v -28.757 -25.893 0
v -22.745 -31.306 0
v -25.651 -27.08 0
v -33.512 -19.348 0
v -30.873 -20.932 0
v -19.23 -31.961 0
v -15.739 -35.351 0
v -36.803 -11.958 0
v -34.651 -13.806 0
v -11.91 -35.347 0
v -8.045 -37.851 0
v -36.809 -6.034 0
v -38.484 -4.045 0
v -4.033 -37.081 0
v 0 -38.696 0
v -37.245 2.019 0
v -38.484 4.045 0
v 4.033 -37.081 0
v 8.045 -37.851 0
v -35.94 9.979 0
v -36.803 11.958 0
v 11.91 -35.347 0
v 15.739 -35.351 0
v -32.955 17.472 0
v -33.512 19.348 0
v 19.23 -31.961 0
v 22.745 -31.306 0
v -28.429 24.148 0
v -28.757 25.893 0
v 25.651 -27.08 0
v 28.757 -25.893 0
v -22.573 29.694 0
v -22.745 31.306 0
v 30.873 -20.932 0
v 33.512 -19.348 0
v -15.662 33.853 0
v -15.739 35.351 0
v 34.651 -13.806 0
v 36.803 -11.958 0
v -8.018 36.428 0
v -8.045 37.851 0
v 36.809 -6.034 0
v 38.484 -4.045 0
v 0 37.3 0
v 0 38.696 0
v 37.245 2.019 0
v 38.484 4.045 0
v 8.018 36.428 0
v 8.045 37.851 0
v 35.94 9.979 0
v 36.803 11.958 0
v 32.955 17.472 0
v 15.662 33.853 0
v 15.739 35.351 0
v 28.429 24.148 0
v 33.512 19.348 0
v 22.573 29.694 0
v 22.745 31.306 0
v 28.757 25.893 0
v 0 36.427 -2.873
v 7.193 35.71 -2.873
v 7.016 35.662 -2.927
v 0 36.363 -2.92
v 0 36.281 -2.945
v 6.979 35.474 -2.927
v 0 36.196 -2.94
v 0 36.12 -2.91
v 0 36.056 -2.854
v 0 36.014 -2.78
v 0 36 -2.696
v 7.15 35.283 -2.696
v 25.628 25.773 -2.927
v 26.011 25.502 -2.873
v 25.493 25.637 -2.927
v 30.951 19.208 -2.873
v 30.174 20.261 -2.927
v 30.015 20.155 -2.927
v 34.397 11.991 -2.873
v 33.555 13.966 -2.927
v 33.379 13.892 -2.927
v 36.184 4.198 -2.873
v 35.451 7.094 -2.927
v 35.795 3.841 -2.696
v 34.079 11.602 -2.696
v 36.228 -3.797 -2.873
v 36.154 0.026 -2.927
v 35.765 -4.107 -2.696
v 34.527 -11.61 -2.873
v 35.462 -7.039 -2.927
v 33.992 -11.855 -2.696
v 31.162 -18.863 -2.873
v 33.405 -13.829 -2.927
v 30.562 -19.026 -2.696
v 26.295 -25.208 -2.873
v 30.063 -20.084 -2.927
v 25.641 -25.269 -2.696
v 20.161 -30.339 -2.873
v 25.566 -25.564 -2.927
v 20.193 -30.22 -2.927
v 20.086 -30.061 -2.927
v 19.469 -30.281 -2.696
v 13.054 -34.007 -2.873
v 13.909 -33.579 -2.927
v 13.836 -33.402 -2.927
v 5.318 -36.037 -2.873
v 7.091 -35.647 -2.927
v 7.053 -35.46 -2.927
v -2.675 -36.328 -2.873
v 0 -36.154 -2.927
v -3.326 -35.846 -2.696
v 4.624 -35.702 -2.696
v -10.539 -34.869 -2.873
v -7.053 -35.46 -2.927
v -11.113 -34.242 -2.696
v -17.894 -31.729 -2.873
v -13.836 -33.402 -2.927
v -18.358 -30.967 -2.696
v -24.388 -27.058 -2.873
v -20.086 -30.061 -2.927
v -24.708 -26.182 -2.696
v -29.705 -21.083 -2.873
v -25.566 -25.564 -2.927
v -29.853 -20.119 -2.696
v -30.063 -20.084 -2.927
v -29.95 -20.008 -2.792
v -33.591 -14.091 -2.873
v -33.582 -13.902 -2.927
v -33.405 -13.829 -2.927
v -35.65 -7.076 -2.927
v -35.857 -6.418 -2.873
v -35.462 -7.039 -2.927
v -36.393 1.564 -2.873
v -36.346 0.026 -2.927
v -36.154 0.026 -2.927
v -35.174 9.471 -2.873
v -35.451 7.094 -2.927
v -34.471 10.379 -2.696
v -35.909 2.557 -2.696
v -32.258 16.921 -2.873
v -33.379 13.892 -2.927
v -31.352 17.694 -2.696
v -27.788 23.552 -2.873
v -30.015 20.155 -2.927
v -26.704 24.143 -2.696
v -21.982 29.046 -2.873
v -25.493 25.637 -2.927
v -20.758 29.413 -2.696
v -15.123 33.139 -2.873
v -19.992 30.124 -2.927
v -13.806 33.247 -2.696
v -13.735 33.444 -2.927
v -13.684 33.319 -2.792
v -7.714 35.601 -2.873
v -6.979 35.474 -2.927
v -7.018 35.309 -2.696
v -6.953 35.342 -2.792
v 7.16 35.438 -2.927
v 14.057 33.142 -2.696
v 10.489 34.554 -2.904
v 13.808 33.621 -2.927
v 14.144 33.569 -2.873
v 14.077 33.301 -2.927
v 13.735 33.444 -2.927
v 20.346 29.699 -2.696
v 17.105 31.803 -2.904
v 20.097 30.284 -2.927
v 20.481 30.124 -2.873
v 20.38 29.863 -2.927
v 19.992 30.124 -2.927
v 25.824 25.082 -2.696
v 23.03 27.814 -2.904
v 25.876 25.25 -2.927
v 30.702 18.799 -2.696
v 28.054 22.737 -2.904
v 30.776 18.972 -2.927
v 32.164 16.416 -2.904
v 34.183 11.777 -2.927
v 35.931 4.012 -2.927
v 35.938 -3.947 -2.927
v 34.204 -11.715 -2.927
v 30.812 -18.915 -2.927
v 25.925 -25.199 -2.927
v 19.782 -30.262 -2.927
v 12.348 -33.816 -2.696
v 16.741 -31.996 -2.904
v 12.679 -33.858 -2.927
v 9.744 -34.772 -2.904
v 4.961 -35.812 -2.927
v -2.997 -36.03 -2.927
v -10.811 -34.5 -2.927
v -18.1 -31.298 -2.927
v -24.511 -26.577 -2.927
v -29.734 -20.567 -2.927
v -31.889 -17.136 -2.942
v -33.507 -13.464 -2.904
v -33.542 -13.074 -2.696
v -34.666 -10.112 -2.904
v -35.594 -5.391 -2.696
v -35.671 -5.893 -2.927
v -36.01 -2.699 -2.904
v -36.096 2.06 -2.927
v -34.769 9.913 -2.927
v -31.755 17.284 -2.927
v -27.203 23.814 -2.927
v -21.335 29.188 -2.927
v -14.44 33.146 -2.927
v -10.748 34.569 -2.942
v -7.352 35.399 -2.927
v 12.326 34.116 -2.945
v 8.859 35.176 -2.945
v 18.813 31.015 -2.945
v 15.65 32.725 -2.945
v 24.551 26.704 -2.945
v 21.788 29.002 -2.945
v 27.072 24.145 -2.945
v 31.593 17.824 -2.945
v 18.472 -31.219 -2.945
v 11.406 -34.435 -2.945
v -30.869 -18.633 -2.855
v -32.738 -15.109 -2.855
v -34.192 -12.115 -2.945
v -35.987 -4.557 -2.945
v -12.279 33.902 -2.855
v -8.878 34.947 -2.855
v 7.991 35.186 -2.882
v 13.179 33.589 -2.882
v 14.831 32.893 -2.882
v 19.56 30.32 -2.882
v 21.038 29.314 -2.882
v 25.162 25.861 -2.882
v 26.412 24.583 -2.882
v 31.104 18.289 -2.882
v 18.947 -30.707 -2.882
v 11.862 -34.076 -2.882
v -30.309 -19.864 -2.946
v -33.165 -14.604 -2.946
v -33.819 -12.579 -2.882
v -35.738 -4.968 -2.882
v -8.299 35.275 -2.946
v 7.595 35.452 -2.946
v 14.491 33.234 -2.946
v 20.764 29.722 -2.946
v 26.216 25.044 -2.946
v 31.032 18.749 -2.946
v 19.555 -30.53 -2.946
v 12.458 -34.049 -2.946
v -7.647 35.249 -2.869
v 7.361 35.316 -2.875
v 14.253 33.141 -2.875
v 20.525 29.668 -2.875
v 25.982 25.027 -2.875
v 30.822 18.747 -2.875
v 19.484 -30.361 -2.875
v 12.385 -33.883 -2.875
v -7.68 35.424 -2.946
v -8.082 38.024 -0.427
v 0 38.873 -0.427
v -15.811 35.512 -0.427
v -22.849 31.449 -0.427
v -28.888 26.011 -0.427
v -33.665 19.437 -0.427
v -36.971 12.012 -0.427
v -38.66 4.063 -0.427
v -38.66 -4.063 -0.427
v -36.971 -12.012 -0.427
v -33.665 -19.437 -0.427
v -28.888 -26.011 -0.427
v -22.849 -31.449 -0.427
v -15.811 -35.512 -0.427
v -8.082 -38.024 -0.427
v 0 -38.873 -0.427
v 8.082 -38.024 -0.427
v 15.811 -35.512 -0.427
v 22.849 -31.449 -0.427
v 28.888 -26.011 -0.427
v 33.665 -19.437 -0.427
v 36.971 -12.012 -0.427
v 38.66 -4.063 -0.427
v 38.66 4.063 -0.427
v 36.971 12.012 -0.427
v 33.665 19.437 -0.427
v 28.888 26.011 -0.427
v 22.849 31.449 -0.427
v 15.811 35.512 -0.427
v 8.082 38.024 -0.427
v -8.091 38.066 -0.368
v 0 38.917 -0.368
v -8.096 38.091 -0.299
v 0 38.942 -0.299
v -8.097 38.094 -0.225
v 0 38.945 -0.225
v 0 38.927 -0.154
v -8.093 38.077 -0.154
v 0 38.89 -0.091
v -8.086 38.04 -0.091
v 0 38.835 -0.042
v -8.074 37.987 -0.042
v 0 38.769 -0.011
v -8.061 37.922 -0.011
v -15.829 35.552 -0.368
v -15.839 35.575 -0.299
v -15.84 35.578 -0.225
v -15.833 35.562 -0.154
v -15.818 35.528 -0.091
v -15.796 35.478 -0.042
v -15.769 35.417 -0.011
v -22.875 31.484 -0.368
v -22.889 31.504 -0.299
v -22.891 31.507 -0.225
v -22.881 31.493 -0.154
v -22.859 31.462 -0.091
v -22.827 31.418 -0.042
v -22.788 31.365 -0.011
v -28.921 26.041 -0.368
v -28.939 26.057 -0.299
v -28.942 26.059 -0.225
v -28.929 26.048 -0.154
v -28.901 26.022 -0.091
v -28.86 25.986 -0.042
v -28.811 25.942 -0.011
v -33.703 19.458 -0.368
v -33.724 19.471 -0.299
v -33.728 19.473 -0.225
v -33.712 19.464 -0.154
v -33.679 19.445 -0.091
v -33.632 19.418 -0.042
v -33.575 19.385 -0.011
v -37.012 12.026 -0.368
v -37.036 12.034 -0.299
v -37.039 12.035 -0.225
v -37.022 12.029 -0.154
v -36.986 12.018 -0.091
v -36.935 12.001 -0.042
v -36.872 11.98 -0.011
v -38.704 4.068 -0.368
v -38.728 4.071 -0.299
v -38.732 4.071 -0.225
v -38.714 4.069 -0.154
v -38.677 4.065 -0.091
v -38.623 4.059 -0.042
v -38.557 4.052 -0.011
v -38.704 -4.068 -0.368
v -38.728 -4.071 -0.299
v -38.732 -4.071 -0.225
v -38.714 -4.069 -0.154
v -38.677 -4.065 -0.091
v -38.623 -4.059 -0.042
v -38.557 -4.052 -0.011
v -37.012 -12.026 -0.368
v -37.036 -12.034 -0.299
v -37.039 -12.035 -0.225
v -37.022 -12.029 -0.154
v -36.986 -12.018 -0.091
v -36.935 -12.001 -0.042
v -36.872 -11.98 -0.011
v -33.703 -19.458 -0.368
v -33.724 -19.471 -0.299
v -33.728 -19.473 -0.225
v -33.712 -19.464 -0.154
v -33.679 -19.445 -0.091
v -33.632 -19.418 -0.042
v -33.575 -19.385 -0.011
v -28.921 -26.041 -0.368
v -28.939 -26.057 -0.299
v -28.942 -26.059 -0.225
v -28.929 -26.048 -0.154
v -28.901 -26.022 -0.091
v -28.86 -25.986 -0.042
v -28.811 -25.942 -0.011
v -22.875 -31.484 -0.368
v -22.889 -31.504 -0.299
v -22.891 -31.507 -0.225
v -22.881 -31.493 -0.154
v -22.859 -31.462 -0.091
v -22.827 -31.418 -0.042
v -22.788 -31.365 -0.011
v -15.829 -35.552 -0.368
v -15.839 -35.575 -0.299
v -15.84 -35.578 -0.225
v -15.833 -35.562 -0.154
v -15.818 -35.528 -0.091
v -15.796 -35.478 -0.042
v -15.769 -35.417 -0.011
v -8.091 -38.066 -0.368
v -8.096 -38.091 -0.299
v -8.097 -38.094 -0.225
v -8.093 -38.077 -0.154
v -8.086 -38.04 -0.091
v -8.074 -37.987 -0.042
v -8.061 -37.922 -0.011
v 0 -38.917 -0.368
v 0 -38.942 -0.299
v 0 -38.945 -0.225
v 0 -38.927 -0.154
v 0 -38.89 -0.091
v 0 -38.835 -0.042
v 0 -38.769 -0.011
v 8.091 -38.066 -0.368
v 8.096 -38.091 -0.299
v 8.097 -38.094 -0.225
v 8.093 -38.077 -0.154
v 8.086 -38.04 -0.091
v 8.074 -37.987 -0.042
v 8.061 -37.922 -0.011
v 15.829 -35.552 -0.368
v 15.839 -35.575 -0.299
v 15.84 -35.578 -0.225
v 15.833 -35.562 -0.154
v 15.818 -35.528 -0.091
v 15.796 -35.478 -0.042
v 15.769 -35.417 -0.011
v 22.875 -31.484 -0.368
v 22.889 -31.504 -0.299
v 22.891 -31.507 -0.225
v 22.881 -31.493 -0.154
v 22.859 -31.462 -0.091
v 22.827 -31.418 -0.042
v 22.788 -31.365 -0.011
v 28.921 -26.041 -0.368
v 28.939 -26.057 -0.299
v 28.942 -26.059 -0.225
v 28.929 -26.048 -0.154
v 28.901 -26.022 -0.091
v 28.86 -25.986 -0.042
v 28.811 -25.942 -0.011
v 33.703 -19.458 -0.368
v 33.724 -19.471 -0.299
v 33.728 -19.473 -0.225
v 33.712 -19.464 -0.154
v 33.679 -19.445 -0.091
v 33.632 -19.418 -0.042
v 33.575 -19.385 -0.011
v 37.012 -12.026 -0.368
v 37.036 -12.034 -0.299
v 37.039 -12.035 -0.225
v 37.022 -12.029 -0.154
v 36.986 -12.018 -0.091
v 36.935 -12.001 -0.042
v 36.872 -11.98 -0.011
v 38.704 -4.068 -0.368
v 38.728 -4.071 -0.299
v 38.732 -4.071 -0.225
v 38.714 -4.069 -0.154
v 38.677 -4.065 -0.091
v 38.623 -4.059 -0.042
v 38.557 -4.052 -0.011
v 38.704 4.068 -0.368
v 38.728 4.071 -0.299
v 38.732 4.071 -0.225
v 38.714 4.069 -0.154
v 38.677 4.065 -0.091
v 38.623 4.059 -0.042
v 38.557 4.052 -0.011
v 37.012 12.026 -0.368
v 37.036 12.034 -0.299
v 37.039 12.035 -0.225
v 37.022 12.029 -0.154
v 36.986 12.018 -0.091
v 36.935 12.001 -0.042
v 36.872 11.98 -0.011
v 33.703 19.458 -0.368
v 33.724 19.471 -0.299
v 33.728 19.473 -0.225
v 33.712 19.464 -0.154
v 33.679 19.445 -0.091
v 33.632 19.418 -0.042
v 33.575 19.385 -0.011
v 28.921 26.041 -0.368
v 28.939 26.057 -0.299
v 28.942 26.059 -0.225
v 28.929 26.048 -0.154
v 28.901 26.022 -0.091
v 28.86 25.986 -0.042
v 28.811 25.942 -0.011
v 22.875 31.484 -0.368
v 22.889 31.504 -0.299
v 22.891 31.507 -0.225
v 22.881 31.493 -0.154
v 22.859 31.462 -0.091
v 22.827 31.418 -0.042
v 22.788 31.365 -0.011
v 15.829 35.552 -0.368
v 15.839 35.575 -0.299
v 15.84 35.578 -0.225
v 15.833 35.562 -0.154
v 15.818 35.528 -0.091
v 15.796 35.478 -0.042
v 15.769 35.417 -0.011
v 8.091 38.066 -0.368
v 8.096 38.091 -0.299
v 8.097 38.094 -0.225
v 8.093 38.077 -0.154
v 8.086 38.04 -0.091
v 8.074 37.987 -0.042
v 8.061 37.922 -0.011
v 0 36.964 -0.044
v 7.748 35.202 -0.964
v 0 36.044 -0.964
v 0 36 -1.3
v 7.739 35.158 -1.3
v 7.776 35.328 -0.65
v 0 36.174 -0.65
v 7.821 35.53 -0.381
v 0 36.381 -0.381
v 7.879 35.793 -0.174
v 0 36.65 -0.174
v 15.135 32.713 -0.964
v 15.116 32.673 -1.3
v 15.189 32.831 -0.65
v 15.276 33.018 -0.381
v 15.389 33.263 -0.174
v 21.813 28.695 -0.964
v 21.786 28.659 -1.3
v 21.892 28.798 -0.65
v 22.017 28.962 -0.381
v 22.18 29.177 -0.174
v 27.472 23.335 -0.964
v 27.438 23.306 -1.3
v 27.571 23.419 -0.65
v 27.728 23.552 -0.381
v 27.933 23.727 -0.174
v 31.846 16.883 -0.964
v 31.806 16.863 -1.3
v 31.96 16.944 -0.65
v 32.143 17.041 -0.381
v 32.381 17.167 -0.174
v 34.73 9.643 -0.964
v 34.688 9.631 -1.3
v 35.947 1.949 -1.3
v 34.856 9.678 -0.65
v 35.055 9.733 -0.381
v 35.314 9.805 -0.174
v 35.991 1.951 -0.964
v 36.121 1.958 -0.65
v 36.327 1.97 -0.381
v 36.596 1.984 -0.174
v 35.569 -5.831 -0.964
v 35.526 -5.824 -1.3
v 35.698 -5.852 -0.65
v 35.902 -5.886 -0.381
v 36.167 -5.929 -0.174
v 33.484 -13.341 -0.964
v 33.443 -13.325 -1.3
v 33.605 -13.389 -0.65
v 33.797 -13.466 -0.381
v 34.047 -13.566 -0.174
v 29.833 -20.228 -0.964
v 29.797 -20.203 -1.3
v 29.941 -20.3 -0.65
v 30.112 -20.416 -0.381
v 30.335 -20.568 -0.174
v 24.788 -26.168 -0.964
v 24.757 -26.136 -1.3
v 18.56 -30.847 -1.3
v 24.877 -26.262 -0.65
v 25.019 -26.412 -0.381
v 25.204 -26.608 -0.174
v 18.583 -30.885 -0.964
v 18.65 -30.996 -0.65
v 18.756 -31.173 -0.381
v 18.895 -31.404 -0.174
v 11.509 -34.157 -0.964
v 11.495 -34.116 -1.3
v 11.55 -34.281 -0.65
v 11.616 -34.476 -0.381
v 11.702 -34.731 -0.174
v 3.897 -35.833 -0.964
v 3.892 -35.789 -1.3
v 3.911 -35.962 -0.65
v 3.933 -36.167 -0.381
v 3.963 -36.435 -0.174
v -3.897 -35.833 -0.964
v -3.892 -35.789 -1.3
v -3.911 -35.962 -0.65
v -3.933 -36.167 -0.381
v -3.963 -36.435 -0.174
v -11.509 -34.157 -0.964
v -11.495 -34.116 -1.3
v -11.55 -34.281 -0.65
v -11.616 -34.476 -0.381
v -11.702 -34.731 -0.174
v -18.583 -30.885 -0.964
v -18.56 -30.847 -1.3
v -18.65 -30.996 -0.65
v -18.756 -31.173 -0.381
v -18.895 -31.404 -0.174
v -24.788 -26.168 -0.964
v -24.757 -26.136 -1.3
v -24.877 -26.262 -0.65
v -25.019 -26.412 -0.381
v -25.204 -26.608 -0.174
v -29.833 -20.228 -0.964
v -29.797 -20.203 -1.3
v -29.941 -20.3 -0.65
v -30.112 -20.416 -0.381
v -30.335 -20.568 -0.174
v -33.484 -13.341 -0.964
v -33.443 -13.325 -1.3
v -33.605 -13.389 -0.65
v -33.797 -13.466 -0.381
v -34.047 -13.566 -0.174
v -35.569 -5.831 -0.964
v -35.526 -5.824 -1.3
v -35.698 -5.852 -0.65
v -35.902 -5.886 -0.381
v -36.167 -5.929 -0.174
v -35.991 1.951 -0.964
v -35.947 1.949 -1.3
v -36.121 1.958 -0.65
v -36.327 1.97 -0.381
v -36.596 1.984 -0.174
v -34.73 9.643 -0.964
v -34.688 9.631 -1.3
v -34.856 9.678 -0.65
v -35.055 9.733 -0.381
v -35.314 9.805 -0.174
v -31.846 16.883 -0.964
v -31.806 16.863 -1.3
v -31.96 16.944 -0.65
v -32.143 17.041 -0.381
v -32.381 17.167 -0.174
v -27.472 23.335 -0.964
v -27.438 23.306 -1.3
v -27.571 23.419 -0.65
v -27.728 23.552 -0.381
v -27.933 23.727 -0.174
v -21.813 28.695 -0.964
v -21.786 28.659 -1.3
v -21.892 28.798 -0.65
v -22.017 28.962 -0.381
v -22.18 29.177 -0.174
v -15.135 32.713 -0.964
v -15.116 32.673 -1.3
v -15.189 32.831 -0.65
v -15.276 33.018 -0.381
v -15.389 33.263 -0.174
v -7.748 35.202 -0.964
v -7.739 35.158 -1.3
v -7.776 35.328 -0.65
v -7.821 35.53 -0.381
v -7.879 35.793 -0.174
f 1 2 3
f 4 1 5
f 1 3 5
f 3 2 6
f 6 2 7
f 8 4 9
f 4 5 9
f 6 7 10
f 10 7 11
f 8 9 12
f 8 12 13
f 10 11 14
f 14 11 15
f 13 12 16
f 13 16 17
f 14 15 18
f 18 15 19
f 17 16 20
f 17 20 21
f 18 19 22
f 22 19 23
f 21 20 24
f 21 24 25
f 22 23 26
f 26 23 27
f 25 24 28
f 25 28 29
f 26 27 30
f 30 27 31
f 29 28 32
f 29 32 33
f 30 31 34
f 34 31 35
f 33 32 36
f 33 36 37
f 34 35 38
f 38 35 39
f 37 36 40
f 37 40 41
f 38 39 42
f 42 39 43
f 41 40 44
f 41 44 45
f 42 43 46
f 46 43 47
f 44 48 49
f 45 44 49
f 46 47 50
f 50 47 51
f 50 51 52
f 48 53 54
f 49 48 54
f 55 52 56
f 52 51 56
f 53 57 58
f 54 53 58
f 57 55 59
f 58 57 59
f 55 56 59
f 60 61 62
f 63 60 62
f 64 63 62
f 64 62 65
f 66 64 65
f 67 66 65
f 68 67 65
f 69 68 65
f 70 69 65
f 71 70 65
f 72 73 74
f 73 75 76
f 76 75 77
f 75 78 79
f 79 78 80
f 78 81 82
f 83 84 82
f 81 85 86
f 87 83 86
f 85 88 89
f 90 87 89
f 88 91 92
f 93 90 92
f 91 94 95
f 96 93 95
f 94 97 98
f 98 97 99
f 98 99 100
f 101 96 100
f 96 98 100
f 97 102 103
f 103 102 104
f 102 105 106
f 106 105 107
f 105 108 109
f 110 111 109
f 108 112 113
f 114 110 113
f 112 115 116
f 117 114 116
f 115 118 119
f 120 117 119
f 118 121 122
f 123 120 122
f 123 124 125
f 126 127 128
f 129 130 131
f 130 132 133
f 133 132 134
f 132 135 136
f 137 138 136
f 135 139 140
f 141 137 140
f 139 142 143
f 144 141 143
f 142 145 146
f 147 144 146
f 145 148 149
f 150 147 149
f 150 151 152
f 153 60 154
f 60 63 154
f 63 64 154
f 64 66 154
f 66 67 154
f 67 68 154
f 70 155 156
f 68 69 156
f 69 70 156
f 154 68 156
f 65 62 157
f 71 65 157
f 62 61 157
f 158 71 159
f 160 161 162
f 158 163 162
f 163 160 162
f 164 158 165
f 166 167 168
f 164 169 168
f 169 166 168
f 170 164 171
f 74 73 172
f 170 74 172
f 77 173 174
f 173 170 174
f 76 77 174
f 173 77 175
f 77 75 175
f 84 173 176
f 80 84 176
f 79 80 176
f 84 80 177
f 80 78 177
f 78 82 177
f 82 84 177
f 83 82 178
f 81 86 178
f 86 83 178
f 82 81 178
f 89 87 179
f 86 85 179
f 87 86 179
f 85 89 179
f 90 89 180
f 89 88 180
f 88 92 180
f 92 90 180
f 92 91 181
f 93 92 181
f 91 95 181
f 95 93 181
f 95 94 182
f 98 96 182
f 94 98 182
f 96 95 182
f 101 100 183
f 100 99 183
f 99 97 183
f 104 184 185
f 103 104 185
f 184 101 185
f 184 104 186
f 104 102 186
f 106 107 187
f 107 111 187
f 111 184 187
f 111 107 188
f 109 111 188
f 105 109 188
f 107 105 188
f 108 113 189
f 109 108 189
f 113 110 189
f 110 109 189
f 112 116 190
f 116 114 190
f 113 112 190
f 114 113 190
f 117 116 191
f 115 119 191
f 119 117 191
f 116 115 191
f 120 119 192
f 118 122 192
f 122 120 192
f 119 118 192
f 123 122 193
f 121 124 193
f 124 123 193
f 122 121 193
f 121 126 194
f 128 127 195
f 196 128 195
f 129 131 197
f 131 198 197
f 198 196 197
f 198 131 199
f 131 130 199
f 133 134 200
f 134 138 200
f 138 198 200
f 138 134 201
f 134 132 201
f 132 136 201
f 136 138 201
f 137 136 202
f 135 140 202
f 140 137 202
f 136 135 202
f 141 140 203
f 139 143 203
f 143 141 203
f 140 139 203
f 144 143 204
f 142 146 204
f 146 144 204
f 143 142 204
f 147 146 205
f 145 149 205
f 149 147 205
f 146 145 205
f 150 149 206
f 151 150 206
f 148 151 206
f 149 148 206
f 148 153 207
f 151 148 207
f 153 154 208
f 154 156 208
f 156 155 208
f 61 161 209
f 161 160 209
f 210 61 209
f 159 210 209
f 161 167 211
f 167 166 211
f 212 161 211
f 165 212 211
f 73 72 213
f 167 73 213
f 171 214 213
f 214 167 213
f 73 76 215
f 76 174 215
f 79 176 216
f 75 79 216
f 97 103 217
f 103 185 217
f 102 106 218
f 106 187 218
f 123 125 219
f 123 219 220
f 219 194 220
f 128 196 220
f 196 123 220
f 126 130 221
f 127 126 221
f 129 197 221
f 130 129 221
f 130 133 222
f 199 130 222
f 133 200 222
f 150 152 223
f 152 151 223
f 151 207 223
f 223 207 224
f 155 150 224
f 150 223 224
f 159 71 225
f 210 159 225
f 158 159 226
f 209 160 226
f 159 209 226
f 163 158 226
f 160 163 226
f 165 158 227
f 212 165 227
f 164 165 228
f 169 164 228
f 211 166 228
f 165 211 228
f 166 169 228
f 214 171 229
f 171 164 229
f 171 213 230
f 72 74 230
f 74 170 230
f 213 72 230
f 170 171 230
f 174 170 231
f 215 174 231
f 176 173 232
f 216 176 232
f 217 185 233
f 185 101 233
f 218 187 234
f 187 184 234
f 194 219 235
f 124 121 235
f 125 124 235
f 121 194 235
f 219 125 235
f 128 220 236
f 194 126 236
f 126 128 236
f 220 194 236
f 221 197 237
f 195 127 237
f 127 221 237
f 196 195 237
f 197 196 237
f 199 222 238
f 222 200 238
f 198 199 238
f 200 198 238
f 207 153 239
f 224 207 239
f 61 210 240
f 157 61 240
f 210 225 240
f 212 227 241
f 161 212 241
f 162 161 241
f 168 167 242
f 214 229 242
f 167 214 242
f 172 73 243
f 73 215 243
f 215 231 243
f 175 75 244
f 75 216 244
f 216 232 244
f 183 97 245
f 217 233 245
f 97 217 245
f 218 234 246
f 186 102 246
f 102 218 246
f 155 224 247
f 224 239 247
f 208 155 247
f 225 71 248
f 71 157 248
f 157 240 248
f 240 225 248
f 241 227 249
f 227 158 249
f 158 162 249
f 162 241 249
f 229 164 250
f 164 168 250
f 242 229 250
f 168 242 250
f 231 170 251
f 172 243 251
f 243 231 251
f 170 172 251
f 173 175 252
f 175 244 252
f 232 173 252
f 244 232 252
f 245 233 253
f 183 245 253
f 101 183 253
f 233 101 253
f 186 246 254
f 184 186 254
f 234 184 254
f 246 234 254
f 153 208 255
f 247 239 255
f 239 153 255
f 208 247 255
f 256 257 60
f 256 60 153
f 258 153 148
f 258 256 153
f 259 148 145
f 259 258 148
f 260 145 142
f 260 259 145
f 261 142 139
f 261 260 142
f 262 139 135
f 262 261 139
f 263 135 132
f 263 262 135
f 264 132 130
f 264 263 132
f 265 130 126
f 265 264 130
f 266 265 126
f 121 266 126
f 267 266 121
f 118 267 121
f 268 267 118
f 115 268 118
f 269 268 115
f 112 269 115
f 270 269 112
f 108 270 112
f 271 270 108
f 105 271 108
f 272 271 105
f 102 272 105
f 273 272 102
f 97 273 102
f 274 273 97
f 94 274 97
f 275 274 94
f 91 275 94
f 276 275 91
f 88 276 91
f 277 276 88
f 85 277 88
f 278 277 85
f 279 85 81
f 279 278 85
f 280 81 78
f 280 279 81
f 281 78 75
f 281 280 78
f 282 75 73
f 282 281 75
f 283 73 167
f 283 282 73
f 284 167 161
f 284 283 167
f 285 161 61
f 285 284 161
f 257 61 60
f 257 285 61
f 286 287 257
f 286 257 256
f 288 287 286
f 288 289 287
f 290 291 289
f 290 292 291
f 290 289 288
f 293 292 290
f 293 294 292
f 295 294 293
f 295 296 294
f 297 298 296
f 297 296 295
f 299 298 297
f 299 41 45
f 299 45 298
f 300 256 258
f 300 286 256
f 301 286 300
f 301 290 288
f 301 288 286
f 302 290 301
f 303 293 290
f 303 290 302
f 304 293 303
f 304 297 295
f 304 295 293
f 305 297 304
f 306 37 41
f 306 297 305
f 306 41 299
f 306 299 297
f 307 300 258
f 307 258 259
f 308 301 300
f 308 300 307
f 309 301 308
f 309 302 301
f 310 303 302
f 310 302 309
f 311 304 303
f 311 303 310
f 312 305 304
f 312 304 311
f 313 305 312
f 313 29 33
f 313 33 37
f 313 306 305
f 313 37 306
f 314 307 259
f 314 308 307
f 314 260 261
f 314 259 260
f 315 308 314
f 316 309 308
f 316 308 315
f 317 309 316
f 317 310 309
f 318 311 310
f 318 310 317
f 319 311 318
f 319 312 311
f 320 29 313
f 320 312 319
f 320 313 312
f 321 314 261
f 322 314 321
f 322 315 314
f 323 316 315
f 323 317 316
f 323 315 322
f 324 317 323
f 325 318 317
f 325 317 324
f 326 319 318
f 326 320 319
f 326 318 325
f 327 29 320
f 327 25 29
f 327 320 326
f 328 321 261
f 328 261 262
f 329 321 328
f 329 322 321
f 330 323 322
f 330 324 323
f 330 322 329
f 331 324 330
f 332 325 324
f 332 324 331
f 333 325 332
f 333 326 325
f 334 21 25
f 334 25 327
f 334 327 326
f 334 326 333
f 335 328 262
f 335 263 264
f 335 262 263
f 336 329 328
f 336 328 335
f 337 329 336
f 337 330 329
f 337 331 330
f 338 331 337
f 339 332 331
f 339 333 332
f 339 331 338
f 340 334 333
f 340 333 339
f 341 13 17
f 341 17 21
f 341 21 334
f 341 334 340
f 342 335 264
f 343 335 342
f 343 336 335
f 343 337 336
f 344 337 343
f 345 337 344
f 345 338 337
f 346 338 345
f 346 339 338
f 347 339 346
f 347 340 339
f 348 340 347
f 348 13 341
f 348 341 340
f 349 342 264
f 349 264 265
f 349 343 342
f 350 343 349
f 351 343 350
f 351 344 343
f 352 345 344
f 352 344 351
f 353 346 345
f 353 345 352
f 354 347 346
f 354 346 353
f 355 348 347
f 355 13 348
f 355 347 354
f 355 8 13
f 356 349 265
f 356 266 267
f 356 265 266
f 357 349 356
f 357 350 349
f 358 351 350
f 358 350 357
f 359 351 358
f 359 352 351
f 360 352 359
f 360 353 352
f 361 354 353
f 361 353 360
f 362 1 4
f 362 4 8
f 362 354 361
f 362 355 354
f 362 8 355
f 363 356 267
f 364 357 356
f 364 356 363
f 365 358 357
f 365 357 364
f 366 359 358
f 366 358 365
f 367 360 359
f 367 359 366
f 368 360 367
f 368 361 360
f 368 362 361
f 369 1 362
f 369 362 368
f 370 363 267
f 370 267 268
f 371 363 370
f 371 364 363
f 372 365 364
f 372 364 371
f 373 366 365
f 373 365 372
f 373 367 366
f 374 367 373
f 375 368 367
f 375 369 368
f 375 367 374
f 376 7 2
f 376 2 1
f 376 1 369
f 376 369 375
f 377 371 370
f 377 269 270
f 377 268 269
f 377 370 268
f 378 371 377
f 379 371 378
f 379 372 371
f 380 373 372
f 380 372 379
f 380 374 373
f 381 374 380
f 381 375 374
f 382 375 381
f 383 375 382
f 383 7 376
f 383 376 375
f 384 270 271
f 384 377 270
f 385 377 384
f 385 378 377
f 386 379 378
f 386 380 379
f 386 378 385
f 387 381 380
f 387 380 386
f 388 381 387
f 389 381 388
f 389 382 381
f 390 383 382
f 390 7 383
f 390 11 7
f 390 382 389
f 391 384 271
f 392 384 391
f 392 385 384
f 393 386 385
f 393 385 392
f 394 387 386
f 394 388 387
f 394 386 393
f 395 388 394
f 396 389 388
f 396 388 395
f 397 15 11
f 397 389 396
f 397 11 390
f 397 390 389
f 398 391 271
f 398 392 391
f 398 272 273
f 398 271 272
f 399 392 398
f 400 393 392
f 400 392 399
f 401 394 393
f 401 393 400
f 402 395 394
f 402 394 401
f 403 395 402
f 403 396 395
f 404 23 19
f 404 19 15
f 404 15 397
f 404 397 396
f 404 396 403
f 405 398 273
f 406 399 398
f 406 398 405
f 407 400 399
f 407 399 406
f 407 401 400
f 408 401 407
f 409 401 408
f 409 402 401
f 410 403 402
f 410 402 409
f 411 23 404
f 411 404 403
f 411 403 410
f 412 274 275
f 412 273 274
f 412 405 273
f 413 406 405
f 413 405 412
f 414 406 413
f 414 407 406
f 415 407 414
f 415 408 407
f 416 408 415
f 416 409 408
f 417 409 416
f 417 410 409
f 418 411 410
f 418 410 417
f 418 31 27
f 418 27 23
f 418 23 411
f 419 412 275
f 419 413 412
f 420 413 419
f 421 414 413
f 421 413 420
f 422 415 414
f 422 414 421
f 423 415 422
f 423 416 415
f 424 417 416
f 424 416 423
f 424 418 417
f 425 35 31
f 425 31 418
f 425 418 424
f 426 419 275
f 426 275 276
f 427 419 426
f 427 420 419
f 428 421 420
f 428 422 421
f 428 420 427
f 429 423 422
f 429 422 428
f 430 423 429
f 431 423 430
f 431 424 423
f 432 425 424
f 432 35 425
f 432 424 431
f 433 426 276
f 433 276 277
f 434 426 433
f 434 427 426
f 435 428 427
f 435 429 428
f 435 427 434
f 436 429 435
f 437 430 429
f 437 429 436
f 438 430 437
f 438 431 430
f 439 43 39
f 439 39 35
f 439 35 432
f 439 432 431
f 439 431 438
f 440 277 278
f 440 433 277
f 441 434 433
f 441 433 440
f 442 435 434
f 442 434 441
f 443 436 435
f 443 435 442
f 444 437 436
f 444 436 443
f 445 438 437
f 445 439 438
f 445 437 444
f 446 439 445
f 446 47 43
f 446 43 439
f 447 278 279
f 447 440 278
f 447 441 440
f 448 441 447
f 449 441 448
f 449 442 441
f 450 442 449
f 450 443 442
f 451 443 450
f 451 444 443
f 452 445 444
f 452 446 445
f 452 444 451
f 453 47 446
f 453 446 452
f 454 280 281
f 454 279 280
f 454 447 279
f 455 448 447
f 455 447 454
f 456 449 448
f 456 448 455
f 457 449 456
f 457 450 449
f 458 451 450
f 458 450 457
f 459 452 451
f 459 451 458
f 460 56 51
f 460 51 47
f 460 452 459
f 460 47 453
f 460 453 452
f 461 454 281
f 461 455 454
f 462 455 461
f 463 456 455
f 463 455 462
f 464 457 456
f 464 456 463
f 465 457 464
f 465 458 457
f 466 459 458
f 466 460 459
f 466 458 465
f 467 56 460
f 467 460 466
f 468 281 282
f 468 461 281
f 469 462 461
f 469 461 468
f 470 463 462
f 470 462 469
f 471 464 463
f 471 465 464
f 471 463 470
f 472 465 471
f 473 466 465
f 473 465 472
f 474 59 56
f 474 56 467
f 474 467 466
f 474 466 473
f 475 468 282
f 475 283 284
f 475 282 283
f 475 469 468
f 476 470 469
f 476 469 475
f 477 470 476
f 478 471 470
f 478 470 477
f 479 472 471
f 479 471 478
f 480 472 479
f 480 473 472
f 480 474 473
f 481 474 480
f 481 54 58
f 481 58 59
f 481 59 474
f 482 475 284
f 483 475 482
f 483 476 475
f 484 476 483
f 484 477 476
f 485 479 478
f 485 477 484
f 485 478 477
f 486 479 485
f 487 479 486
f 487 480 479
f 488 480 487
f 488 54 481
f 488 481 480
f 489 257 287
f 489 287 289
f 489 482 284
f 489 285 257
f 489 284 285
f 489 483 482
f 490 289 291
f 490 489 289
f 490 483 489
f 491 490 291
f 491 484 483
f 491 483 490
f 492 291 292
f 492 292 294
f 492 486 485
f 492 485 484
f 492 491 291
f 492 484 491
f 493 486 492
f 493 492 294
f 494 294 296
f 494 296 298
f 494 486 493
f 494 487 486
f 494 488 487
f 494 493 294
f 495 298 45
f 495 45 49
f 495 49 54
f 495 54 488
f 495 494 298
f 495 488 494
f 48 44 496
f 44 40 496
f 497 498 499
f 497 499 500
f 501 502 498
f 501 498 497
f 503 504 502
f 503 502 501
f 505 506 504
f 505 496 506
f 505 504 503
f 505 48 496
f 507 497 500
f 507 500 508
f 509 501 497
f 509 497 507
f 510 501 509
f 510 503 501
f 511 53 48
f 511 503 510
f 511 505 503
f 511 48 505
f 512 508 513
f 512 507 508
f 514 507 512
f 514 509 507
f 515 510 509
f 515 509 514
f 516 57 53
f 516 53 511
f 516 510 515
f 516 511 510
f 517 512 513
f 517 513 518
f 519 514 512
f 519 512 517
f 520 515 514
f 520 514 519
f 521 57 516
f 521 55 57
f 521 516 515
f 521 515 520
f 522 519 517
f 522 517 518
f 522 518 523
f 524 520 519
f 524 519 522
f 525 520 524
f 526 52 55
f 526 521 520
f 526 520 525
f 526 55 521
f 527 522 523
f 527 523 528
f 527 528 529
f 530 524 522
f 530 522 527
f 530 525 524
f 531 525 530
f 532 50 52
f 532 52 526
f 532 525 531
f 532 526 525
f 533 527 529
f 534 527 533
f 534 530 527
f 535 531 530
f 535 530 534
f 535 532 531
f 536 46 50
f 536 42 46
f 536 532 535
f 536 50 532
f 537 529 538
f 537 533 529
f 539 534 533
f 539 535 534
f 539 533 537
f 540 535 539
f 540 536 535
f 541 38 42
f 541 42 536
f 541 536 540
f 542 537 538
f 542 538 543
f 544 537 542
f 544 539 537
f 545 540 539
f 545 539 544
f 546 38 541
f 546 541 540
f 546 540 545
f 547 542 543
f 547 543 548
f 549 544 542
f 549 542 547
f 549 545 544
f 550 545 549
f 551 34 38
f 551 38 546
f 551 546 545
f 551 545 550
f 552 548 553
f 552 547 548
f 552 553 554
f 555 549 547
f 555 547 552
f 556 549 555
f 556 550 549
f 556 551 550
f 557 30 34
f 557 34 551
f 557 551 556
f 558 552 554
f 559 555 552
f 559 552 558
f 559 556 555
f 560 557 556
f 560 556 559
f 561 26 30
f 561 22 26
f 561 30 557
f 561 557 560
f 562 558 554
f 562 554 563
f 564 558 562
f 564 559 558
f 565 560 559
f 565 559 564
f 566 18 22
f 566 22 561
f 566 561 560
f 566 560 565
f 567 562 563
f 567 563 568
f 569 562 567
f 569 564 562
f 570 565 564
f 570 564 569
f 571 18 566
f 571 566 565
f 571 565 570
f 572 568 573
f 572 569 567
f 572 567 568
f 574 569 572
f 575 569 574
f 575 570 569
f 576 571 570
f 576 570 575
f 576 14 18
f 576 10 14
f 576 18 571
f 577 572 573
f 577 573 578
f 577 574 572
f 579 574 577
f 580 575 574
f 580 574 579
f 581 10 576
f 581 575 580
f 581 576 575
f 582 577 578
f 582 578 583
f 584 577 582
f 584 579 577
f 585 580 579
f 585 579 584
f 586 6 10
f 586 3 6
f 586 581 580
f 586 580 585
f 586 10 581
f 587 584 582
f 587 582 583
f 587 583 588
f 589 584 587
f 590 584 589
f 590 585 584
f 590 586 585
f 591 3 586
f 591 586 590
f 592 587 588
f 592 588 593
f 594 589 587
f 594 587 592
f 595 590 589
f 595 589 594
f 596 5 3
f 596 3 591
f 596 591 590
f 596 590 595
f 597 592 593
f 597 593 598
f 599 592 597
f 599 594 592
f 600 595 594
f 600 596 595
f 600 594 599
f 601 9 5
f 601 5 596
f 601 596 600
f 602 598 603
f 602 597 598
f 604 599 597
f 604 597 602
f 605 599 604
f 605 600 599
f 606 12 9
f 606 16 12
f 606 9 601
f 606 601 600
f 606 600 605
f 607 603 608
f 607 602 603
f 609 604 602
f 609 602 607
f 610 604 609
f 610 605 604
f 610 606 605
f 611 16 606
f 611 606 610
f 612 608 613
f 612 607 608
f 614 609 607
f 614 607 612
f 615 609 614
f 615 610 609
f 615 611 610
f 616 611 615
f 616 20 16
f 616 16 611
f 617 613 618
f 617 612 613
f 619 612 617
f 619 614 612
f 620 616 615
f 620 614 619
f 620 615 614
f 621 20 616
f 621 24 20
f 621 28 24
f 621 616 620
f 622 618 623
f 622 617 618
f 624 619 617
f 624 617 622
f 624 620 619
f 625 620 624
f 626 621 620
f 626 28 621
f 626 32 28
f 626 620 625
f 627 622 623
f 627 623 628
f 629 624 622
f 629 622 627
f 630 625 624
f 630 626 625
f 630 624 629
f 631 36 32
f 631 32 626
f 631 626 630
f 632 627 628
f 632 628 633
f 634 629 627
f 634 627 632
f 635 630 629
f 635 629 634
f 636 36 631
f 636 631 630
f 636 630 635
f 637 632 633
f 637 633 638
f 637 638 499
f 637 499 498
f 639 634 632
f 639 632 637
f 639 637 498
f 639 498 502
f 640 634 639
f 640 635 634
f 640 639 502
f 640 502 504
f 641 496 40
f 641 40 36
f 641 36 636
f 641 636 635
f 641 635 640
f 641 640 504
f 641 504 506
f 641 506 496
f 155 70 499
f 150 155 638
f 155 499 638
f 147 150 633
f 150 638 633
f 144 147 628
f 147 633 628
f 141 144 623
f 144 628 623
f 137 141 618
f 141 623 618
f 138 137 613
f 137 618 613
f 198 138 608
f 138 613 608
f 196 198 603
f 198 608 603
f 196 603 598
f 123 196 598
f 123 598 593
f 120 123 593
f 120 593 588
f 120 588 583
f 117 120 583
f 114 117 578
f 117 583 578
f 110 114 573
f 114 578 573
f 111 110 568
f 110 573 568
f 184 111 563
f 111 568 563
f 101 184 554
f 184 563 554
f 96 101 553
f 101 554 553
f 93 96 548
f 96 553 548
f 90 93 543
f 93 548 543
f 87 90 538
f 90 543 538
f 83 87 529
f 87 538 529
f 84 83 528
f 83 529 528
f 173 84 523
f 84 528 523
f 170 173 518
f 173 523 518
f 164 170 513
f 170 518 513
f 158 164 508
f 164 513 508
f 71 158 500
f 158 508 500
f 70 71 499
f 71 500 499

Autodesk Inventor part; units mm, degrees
ref_plane "YZ Plane" through (0, 0, 0) normal (1, 0, 0) x (0, 1, 0)
ref_plane "XZ Plane" through (0, 0, 0) normal (0, 1, 0) x (-1, 0, 0)
ref_plane "XY Plane" through (0, 0, 0) normal (0, 0, 1) x (1, 0, 0)
sketch "Эскиз1" plane through (0, 0, 0) normal (1, 0, 0) x (0, 1, 0)
  line L0 (-7.86, 0) -> (47.16, 0) construction
  line L1 (0, 0.66) -> (0, -3.96) construction
  line L2 (39.3, 0) -> (36, 0)
  line L3 (36, -3.3) -> (39.3, 0)
  line L4 (36, -3.3) -> (36, 0)
  point P0 (0, 0)
  dimension "d0" = 36
  dimension "d1" = 3.3
  dimension "d2" = 45
revolve "Вращение1" add sketch "Эскиз1" angle 360 about axis through (0, 0, 0) along (0, 0, -1)
fillet "Сопряжение1" radius 1.3 1 edges at (0, -36, 0)
fillet "Сопряжение2" radius 0.25 1 edges at (0, -39.3, 0)
fillet "Сопряжение3" radius 0.25 1 edges at (0, -36, -3.3)
properties part number "кол_072"
